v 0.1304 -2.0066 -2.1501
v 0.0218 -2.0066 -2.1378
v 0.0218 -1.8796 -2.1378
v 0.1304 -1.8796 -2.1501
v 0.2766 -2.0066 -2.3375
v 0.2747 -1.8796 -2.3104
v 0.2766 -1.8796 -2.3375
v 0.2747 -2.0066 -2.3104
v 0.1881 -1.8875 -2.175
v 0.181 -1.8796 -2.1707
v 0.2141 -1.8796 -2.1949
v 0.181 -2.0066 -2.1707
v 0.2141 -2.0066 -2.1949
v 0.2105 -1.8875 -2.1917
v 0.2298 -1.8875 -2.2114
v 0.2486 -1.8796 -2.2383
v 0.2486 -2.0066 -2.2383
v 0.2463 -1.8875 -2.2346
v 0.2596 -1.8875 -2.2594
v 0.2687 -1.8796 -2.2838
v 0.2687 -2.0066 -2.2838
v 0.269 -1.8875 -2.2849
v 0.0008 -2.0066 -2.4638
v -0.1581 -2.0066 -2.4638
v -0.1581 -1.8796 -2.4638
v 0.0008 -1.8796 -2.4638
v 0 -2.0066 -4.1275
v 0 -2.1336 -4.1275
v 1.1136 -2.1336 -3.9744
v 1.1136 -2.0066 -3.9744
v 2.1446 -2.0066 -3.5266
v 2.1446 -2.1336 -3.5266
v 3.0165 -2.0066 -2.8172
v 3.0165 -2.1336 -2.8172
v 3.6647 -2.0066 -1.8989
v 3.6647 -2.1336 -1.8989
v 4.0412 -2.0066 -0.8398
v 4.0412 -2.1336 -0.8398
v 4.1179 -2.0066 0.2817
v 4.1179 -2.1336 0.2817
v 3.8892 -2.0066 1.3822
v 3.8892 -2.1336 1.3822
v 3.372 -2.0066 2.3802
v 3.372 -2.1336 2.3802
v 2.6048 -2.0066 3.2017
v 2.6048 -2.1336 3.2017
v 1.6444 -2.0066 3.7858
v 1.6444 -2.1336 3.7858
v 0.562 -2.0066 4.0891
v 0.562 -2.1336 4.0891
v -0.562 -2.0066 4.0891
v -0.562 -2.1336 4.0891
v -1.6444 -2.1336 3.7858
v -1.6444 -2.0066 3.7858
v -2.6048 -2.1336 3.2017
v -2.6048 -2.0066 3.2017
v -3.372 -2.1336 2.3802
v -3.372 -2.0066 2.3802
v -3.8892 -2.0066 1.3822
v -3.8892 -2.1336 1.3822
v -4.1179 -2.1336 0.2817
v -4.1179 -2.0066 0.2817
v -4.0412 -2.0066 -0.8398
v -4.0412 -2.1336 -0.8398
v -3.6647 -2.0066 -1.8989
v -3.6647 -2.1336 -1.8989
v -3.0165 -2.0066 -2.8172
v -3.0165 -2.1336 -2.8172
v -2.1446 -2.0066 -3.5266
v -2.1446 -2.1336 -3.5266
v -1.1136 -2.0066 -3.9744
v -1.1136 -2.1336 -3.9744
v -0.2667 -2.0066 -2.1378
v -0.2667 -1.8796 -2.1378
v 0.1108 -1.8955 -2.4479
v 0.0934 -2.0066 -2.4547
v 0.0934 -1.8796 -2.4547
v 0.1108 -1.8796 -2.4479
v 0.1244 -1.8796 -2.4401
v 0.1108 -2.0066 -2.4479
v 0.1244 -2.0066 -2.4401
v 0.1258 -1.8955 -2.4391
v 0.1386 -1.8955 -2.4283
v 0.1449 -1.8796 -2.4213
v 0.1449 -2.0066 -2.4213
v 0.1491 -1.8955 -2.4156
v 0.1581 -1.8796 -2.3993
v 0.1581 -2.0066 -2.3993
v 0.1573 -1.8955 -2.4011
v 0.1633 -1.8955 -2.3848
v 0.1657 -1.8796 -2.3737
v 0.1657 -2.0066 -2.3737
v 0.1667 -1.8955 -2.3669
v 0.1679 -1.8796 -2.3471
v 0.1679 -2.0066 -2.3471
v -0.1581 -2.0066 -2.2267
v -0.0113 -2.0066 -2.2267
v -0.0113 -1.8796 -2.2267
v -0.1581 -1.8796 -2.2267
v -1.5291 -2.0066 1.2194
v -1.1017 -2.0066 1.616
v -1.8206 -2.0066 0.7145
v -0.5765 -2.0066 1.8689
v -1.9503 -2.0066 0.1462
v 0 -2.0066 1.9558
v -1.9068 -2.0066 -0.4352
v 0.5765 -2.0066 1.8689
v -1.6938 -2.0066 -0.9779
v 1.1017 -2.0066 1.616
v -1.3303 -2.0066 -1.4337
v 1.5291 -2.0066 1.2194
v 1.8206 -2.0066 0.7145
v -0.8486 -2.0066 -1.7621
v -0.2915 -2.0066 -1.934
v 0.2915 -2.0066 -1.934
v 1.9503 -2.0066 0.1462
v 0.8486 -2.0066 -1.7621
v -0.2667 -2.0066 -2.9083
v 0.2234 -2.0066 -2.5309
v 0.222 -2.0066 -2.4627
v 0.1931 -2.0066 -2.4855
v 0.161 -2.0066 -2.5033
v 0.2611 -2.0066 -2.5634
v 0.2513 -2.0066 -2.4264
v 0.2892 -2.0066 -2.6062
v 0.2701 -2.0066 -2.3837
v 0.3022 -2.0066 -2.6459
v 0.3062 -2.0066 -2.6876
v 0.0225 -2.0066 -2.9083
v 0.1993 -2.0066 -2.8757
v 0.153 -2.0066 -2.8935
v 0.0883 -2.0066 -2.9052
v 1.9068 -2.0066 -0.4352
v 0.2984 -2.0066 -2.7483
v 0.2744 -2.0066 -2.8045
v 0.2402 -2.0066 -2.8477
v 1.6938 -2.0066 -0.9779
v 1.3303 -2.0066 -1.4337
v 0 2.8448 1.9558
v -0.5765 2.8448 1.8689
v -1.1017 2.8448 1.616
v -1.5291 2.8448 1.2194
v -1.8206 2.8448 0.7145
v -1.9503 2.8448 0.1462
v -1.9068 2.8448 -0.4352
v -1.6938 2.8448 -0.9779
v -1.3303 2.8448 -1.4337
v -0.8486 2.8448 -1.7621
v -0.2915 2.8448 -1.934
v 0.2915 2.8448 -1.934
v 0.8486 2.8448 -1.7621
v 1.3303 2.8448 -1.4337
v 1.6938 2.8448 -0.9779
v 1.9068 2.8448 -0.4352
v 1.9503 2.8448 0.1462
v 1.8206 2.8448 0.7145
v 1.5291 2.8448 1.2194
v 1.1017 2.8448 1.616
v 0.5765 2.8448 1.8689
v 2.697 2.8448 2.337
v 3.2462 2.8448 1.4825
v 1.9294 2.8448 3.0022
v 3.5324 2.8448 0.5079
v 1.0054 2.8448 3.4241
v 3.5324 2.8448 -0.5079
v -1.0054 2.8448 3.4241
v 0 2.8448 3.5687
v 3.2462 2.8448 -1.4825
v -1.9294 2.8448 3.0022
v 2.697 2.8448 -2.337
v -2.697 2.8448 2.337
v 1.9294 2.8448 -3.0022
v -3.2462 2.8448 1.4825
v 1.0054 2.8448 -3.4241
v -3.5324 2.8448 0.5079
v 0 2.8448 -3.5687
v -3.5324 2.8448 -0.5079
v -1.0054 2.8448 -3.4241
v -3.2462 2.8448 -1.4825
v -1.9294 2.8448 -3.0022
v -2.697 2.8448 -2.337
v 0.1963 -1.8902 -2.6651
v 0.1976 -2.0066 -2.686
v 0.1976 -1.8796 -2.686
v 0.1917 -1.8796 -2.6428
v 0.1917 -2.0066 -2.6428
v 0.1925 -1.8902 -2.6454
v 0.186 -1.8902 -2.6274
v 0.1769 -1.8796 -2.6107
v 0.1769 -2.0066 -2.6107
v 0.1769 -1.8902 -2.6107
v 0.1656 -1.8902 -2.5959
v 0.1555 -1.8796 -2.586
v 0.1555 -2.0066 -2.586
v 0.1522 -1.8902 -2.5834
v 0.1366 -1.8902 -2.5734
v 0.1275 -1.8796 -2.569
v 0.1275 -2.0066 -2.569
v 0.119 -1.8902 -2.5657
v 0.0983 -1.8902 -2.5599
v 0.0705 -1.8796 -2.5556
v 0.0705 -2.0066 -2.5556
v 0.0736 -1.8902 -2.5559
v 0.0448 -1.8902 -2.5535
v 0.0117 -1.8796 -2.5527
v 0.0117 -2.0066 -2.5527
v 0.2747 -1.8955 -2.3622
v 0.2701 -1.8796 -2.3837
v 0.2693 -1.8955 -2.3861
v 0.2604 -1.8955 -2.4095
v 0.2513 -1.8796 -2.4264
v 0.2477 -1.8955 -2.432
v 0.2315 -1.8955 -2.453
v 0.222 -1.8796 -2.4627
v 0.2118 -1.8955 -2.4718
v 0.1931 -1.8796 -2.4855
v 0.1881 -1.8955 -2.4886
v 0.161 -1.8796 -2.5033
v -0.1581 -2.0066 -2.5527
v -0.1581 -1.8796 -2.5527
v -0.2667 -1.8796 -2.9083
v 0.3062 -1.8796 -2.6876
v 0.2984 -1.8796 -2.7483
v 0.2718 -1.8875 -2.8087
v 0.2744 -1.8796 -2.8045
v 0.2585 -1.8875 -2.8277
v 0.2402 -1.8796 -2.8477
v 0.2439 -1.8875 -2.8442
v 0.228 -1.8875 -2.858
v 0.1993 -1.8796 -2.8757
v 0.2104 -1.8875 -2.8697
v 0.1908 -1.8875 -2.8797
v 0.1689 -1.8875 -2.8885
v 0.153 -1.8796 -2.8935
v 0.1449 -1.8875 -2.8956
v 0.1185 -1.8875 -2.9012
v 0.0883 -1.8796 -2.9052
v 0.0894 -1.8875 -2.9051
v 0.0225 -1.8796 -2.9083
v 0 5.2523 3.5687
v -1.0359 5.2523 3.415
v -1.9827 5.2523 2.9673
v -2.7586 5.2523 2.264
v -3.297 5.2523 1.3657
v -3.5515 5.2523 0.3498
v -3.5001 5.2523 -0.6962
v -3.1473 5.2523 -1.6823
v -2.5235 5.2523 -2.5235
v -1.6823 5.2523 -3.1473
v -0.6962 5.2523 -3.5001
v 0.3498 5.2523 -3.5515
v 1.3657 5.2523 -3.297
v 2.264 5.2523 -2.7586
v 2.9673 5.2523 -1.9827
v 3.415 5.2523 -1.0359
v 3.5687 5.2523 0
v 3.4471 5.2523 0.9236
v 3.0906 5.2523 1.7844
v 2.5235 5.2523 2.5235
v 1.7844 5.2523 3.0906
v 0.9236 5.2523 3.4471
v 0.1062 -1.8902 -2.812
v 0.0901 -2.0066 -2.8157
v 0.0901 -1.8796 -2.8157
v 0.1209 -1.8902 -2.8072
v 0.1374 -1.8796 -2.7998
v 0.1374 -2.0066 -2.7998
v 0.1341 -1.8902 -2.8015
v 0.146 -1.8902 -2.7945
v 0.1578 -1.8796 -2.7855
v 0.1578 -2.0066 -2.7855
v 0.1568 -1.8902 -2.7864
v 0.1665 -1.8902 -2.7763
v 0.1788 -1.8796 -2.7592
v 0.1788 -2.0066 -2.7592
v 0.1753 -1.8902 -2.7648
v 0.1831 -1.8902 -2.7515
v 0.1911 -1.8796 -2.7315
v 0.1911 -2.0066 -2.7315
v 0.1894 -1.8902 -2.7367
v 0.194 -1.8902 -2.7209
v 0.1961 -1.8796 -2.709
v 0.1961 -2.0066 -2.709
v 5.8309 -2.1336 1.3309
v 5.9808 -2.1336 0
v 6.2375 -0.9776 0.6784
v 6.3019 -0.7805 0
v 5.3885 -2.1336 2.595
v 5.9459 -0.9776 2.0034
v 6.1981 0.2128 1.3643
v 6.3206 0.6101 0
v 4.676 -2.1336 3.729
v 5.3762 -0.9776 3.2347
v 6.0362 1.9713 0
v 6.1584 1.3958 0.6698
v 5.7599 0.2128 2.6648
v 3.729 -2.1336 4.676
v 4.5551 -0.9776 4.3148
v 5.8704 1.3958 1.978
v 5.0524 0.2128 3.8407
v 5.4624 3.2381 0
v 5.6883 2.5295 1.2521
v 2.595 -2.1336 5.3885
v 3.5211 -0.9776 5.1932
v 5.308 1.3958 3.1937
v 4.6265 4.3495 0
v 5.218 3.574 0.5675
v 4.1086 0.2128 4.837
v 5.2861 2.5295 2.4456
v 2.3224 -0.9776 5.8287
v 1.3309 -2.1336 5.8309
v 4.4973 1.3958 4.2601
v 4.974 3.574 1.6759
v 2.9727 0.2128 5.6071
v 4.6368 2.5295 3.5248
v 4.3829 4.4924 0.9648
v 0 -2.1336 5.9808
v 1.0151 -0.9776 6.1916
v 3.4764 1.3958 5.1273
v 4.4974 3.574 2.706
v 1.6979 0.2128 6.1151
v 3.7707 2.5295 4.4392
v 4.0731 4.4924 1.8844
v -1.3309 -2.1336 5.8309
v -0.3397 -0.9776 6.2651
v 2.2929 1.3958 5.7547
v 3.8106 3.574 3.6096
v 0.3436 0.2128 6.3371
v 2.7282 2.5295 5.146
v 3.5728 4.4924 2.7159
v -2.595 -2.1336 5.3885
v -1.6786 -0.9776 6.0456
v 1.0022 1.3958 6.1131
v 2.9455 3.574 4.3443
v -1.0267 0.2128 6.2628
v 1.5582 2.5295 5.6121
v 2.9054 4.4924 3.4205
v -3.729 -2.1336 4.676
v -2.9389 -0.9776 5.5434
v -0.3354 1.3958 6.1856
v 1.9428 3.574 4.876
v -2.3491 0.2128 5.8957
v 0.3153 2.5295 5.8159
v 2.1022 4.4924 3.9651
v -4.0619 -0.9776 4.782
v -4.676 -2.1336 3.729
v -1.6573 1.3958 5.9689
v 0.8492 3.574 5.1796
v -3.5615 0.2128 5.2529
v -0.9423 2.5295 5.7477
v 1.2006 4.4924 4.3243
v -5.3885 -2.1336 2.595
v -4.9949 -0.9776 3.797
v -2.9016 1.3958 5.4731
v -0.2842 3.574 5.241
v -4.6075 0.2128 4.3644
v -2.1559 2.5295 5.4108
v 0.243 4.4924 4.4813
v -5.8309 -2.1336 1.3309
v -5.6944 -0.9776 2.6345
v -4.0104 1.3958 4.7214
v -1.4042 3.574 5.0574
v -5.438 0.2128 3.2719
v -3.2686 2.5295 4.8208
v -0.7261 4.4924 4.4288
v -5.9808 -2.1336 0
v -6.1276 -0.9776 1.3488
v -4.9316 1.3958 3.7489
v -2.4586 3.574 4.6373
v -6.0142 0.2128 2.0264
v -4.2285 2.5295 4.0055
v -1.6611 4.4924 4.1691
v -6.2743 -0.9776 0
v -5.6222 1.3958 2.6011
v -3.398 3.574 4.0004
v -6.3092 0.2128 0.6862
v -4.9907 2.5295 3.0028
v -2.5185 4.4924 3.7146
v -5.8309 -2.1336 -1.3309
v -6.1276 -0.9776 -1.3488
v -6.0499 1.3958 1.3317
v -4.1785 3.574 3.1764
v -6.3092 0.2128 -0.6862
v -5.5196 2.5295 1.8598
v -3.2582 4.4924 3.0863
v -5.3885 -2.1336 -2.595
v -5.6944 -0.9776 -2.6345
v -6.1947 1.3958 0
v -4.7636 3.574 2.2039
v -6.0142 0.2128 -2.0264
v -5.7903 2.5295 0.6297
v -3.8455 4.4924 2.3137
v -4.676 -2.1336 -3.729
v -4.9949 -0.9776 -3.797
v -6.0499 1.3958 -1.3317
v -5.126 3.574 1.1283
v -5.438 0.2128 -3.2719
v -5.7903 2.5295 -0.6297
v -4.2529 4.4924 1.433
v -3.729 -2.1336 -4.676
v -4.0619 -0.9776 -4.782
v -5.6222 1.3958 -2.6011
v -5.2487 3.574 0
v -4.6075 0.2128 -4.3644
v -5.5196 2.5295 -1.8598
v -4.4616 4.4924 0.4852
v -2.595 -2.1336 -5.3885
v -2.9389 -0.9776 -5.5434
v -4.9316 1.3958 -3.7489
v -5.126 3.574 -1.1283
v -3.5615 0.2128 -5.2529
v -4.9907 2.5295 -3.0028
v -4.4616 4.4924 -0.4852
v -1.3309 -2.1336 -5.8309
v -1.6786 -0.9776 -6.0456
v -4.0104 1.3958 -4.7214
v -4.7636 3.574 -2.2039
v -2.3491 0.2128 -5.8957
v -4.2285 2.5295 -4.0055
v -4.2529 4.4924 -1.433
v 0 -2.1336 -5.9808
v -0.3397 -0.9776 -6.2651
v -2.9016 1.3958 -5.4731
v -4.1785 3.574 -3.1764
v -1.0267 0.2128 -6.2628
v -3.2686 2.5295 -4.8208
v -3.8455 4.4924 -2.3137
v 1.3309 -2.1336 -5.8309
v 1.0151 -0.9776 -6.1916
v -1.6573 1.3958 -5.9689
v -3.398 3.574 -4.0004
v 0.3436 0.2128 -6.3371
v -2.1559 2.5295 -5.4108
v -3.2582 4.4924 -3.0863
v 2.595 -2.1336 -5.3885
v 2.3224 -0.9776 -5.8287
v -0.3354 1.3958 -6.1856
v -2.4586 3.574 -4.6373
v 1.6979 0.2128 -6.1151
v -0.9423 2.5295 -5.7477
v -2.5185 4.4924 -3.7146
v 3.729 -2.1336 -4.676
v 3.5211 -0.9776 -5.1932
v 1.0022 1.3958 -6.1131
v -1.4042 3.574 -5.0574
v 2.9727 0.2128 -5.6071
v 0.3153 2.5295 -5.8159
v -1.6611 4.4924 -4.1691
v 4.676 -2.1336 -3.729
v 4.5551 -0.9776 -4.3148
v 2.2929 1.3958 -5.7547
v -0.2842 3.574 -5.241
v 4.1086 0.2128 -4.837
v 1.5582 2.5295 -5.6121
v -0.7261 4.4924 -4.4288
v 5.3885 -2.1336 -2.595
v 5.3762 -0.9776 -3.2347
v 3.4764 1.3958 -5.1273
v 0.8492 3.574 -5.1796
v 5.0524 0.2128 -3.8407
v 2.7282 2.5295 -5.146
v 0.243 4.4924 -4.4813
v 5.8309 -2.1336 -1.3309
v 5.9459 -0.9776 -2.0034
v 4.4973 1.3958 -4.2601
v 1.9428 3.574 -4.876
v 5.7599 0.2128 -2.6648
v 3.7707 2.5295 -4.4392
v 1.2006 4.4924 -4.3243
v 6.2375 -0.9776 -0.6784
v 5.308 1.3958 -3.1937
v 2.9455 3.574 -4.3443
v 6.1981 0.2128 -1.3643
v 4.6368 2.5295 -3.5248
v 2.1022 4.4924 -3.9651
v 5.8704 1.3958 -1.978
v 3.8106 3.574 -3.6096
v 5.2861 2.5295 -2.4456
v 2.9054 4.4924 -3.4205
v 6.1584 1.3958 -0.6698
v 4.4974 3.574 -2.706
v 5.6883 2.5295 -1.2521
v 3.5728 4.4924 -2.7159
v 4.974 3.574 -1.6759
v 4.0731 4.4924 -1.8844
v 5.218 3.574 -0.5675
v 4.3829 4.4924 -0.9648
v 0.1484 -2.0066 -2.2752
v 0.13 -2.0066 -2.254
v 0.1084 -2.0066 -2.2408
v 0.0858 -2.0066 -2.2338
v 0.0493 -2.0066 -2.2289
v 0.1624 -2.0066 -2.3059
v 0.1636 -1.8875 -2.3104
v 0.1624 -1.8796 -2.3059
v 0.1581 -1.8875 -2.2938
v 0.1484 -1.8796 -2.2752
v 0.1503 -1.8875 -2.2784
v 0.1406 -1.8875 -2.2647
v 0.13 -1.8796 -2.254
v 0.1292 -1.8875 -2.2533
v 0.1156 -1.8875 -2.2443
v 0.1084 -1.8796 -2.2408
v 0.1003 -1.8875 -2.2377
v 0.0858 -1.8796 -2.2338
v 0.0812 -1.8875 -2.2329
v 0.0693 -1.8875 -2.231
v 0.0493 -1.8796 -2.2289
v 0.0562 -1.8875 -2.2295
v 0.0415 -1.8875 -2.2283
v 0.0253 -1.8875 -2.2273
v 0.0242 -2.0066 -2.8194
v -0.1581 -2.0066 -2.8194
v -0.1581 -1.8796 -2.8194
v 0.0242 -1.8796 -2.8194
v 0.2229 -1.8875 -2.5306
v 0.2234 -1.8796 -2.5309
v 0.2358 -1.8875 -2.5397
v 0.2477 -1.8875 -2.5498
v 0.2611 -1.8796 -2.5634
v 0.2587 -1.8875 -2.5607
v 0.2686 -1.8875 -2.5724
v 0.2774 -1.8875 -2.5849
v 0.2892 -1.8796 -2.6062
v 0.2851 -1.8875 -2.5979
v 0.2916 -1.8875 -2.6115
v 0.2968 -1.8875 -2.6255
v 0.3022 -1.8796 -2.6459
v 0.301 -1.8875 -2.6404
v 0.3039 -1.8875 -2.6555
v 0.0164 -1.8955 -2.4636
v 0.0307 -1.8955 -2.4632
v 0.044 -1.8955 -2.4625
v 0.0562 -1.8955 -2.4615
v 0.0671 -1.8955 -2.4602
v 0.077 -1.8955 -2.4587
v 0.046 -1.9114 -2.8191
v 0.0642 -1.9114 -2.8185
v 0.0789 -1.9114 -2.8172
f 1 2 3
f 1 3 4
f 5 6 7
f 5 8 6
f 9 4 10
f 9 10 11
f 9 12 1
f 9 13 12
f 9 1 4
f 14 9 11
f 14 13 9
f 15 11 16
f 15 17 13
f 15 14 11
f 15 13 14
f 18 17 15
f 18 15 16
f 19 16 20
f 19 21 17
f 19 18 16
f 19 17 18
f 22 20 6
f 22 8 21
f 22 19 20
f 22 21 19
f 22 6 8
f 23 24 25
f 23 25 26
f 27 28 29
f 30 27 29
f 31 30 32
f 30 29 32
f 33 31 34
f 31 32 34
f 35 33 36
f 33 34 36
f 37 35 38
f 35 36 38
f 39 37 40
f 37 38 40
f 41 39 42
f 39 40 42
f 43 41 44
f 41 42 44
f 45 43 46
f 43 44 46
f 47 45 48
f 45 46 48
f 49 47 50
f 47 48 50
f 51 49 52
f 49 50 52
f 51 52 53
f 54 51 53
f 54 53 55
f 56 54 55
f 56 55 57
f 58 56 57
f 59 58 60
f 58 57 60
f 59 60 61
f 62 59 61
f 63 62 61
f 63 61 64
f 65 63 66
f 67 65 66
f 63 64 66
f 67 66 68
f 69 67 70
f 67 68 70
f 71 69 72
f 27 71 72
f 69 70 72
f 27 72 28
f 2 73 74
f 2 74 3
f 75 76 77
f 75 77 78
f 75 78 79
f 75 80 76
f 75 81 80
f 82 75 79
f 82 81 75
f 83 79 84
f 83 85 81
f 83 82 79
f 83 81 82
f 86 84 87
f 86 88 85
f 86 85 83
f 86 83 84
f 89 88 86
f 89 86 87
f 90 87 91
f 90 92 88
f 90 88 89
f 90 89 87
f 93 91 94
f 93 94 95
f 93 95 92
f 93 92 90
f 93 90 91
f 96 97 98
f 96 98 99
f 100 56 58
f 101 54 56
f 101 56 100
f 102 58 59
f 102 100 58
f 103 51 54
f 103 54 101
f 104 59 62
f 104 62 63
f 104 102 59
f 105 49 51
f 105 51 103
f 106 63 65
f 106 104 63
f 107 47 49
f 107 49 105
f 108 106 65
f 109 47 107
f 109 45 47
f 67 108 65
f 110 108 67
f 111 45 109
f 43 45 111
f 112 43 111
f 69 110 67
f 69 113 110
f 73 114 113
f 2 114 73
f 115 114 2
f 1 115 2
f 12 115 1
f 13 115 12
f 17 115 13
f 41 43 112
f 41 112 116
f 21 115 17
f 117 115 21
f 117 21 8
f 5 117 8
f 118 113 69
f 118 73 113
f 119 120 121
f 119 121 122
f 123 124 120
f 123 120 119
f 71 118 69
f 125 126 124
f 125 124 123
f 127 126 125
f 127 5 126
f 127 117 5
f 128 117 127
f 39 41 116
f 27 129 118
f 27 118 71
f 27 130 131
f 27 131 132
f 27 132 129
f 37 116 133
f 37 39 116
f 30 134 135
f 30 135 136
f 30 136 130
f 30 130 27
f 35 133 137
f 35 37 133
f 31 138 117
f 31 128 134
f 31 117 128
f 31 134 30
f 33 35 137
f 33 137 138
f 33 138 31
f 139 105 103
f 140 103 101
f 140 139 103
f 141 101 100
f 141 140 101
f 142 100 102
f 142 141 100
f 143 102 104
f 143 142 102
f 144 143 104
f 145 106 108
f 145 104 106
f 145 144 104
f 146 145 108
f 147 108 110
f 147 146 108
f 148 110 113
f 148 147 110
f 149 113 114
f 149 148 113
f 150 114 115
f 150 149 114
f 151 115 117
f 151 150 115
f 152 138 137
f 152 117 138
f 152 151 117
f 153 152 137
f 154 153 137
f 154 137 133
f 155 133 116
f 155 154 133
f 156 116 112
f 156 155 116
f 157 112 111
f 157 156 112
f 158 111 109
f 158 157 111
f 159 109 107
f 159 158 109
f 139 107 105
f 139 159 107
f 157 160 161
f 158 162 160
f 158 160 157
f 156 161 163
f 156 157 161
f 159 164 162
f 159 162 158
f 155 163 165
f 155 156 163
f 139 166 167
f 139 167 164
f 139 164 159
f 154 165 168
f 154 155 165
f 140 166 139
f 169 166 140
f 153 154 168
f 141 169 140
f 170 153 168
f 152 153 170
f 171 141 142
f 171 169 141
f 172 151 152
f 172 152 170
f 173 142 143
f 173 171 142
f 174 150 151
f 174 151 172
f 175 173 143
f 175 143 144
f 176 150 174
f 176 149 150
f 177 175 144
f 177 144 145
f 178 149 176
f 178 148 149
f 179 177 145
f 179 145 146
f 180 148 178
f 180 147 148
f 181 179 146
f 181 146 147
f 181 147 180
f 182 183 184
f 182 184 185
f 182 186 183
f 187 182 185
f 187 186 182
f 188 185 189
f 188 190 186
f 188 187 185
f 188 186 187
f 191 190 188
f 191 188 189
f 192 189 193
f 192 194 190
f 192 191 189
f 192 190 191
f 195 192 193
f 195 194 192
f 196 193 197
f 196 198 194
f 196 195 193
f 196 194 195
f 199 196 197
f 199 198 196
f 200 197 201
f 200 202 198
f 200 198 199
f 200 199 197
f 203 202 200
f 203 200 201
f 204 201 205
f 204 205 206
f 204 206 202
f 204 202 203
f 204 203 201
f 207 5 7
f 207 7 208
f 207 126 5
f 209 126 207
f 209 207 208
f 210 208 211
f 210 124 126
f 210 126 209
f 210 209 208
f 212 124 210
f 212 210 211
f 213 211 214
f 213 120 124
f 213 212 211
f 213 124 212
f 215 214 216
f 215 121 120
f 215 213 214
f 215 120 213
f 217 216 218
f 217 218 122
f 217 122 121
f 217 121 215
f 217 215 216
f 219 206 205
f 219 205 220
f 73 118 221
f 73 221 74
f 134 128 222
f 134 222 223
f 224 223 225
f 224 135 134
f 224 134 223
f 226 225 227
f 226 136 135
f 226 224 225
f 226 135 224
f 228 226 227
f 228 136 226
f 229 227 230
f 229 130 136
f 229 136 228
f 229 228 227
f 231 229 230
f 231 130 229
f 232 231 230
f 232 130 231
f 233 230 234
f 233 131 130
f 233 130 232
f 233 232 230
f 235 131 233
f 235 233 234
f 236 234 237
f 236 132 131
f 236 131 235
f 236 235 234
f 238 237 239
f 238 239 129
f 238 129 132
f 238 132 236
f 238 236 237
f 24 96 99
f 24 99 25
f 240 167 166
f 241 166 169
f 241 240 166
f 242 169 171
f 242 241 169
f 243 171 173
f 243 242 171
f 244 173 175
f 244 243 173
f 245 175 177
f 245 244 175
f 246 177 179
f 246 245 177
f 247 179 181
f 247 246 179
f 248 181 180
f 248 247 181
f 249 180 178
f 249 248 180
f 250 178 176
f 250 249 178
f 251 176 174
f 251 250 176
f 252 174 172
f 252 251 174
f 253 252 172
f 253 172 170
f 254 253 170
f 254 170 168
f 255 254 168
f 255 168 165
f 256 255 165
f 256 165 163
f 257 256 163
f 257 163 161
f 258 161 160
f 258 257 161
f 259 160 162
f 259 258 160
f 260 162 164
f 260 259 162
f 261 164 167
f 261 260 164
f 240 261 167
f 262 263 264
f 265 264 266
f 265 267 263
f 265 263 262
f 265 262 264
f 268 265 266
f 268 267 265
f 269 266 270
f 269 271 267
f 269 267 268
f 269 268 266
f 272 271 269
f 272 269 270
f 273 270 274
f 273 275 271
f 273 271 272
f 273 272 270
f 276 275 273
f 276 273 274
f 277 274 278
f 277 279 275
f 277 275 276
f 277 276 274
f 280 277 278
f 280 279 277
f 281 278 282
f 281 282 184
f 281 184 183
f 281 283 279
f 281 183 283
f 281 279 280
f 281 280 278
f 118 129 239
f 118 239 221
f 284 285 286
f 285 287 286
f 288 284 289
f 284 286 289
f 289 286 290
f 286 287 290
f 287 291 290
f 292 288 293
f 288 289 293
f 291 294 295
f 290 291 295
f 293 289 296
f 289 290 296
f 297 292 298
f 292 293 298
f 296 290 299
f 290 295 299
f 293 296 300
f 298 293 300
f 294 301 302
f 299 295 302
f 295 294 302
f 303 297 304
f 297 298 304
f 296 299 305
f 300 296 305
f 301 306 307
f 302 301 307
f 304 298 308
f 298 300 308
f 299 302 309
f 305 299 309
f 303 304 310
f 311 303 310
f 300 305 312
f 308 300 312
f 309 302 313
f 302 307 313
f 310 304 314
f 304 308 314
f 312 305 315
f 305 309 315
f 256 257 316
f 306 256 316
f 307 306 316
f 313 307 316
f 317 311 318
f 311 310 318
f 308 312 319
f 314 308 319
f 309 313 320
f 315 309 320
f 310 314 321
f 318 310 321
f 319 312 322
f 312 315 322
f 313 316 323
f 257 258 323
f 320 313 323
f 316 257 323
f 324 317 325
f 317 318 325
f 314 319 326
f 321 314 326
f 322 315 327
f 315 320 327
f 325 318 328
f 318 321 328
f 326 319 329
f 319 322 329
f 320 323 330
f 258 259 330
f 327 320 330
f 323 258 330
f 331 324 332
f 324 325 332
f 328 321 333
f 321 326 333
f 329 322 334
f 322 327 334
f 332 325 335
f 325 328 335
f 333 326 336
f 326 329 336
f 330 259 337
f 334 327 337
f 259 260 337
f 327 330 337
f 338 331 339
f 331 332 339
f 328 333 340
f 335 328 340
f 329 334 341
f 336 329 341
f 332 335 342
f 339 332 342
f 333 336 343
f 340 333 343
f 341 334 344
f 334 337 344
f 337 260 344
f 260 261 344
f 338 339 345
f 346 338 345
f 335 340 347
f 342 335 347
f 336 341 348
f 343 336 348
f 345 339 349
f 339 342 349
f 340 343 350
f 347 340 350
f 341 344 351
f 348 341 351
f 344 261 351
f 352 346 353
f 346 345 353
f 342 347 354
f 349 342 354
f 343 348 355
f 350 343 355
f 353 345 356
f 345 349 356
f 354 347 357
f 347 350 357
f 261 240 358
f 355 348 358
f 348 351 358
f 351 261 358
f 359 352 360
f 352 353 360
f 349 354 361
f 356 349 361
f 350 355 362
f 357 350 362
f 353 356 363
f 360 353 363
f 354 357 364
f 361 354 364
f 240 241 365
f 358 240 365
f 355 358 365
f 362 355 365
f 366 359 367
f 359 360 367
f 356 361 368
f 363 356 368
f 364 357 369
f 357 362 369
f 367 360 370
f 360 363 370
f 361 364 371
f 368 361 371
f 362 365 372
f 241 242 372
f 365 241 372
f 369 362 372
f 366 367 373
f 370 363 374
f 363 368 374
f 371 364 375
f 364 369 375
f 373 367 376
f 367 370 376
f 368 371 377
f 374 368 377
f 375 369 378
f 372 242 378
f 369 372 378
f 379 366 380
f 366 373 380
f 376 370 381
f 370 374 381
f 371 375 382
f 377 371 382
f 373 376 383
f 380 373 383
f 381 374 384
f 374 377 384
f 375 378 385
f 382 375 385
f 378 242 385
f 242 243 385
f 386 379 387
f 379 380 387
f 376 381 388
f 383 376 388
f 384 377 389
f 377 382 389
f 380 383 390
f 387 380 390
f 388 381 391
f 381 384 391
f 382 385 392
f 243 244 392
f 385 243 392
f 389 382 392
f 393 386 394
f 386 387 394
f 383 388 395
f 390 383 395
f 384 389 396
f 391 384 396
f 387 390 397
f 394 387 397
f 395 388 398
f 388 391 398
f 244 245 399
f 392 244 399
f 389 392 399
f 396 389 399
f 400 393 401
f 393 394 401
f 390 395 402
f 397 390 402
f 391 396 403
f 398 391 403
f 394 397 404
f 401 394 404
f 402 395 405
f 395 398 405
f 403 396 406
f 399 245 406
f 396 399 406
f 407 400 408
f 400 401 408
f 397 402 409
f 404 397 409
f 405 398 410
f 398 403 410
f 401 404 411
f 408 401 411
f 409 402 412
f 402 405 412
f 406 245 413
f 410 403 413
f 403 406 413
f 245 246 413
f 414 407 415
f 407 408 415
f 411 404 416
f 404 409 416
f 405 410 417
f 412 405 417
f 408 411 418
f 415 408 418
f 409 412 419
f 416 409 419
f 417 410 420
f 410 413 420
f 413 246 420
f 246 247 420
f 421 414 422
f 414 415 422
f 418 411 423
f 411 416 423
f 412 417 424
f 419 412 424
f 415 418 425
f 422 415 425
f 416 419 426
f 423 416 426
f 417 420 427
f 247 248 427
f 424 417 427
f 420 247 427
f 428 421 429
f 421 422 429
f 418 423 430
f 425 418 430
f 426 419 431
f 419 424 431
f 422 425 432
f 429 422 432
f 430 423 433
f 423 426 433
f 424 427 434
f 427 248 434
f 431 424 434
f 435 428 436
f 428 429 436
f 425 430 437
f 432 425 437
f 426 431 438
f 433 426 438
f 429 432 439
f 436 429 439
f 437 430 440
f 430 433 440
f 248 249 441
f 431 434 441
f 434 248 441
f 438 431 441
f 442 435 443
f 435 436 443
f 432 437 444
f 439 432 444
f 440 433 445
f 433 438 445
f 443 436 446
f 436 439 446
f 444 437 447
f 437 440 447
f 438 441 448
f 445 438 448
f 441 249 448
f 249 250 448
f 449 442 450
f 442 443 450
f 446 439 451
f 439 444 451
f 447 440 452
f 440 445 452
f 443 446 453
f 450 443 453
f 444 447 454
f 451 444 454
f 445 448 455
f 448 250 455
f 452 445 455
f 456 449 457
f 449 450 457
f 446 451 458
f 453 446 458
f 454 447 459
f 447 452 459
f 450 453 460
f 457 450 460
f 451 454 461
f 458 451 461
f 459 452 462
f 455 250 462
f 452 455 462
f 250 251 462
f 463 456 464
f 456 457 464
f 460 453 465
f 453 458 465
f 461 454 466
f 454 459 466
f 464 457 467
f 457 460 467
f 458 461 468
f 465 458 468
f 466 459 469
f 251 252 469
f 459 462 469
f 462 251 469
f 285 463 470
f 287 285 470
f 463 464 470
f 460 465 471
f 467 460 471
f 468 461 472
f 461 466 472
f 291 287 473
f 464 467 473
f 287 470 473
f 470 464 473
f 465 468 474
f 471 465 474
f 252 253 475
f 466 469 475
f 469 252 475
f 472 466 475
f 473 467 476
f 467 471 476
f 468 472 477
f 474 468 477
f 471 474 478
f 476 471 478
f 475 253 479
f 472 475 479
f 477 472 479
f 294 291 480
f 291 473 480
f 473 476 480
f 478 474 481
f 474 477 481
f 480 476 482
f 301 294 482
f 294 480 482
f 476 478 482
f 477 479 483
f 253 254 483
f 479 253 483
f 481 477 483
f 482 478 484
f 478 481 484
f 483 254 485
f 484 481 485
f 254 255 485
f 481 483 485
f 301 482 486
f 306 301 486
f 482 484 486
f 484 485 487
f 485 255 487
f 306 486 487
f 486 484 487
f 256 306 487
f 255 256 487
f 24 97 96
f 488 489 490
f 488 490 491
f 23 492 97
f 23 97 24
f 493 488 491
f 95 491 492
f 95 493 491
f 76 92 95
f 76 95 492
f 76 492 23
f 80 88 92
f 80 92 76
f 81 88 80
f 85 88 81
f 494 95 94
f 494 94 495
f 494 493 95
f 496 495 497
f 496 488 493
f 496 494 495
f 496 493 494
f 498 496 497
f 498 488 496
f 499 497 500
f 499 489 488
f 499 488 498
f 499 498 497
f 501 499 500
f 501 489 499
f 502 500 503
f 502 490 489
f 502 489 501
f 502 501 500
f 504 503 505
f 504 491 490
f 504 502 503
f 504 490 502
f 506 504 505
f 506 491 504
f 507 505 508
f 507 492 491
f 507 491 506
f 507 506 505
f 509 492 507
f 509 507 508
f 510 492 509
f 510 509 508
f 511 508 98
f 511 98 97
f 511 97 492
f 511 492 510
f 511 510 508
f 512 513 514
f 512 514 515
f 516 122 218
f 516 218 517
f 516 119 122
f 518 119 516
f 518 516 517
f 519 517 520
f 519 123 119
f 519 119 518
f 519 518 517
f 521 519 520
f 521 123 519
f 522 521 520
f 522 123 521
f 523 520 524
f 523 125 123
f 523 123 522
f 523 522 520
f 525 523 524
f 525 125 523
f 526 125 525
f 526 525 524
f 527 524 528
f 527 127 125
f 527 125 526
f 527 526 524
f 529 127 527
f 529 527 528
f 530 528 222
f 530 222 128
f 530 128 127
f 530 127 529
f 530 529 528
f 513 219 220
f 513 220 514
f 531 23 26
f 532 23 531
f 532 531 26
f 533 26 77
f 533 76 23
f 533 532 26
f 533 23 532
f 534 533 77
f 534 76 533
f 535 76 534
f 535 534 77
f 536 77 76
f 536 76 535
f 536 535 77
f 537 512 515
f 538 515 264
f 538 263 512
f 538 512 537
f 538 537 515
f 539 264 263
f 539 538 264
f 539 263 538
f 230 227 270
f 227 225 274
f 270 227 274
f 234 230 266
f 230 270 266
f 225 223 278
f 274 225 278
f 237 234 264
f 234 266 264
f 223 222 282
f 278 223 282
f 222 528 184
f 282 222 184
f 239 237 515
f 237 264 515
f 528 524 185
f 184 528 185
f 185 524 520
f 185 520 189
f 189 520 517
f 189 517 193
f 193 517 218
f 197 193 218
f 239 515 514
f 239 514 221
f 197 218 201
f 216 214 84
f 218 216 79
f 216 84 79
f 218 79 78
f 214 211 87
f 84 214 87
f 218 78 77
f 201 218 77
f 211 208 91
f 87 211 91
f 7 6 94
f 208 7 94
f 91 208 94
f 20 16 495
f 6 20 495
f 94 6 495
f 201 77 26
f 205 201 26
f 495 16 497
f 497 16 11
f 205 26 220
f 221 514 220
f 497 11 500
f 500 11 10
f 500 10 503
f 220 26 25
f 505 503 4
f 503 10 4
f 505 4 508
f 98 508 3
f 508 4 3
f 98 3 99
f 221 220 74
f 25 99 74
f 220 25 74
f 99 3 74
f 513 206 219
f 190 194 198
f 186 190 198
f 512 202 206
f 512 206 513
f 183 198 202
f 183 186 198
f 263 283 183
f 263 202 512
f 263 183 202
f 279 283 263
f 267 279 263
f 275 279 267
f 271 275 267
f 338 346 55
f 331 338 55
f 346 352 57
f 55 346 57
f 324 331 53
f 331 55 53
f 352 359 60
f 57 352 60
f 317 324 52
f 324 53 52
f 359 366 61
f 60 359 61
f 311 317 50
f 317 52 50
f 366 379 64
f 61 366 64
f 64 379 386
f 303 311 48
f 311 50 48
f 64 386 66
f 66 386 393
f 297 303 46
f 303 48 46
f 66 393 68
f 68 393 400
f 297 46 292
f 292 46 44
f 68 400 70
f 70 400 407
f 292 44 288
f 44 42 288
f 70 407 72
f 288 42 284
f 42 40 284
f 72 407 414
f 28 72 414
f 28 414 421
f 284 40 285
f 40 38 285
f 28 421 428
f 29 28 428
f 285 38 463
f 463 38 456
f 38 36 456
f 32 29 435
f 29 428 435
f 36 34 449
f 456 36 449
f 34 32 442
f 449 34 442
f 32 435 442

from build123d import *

# Parameters (mm, degrees)
TRUNCATED_BALL_DEPTH      = 11.998522628
TRUNCATED_BALL_DEPTH_BACK = 11.998522628
SKETCH3_R                 = 4.1275
RECESSED_DEPTH            = 0.127
CUT_EXTRUDE1_DEPTH        = 0.127


with BuildPart() as part:
    # Sketch1 → Complete_Ball (revolve)
    with BuildSketch(Plane.XY):
        with BuildLine():
            Line((0, 6.35), (0, -6.35))
            ThreePointArc((0, -6.35), (6.35, 0), (0, 6.35))
        make_face()
    revolve(axis=Axis((0, 5.621617492, 0), (0, -1, 0)))

    # Sketch2 → Truncated_ball (cut, two sides)
    with BuildSketch(Plane.XY) as truncated_ball_sk:
        with BuildLine():
            Line((-5.980823609, -2.1336), (5.980823609, -2.1336))
            ThreePointArc((5.980823609, -2.1336), (0, -6.35), (-5.980823609, -2.1336))
        make_face()
    extrude(amount=TRUNCATED_BALL_DEPTH, mode=Mode.SUBTRACT)
    extrude(truncated_ball_sk.sketch, amount=-TRUNCATED_BALL_DEPTH_BACK, mode=Mode.SUBTRACT)

    # Sketch3 → Recessed (cut)
    with BuildSketch(Plane.XZ.offset(2.1336)):
        with Locations(Location((0, 0, 0), (0, 0, 270))):
            Circle(SKETCH3_R)
    extrude(amount=-RECESSED_DEPTH, mode=Mode.SUBTRACT)

    # Sketch5 → Counterbored_hole (revolve, cut)
    with BuildSketch(Plane.XY, mode=Mode.PRIVATE) as counterbored_hole_sk:
        Polygon((1.9558, -2.1336), (1.9558, 2.8448), (3.5687, 2.8448), (3.5687, 6.35), (0, 6.35), (0, -2.1336), align=None)
    revolve(counterbored_hole_sk.sketch.rotate(Axis((0, 7.818373071, 0), (0, -1, 0)), 90), axis=Axis((0, 7.818373071, 0), (0, -1, 0)), mode=Mode.SUBTRACT)

    # Sketch9 → Cut-Extrude1 (cut)
    with BuildSketch(Plane.XZ.offset(2.0066)):
        with BuildLine():
            Line((-0.266710017, -2.9083), (-0.266710017, -2.137804395))
            Line((-0.266710017, -2.137804395), (0.021762797, -2.137804395))
            add(Edge.make_bspline(
                [(0.021762797, -2.137804395), (0.028916445, -2.137831838), (0.042875247, -2.137885387), (0.063257985, -2.1392246), (0.08256196, -2.141056366), (0.100828728, -2.143417569), (0.117979251, -2.146843626), (0.133997544, -2.150994066), (0.148966969, -2.155781463), (0.167264808, -2.16307422), (0.188351063, -2.174299324), (0.210936444, -2.19104895), (0.230586604, -2.211159242), (0.246755795, -2.234216831), (0.260077465, -2.258846684), (0.269522373, -2.28457958), (0.275561015, -2.31085525), (0.276246169, -2.328647268), (0.276588166, -2.337528215)],
                knots=[0, 0, 0, 0, 0.939712594, 1.833646414, 2.682508961, 3.487467313, 4.25240329, 4.978730417, 5.660668875, 6.315918528, 7.564895217, 8.787077865, 9.996481721, 11.241996224, 12.475862915, 13.665015424, 14.834484263, 16, 16, 16, 16], degree=3))
            add(Edge.make_bspline(
                [(0.276588166, -2.337528215), (0.276228655, -2.345790733), (0.275513098, -2.362236109), (0.269818069, -2.386461149), (0.260829571, -2.409983511), (0.24811958, -2.432517235), (0.231874618, -2.453650072), (0.211735504, -2.472667007), (0.187991636, -2.489608795), (0.170171864, -2.498639265), (0.160982956, -2.5032959)],
                knots=[0, 0, 0, 0, 0.926741525, 1.844548388, 2.778836836, 3.746021974, 4.738420572, 5.759761325, 6.844803049, 8, 8, 8, 8], degree=3))
            add(Edge.make_bspline(
                [(0.160982956, -2.5032959), (0.166667275, -2.505075335), (0.177796205, -2.508559168), (0.193795198, -2.514934092), (0.208813366, -2.522192856), (0.2228834, -2.530347388), (0.23591023, -2.539473202), (0.2478571, -2.549584525), (0.258806843, -2.560524888), (0.268739897, -2.572287634), (0.277465043, -2.58479707), (0.285290409, -2.597779786), (0.291752256, -2.611392125), (0.297048797, -2.625598745), (0.301180886, -2.640311862), (0.304148175, -2.655588064), (0.305839455, -2.671391794), (0.306093479, -2.68212759), (0.306222612, -2.687585113)],
                knots=[0, 0, 0, 0, 1.127427615, 2.20731145, 3.257257018, 4.283066884, 5.282973838, 6.264540225, 7.242620376, 8.210460609, 9.17525685, 10.12748095, 11.077310519, 12.023587065, 12.994999128, 13.967387486, 14.966724908, 16, 16, 16, 16], degree=3))
            add(Edge.make_bspline(
                [(0.306222612, -2.687585113), (0.30595645, -2.69634709), (0.305428882, -2.713714396), (0.301191929, -2.739276148), (0.294031702, -2.7638644), (0.28417626, -2.787081588), (0.272433103, -2.808549297), (0.259086593, -2.827705432), (0.244477096, -2.844352877), (0.22819322, -2.858356354), (0.210340006, -2.870241208), (0.190413202, -2.880249032), (0.168566879, -2.889074974), (0.144357023, -2.896125462), (0.117794653, -2.901726361), (0.088519295, -2.905365274), (0.056485971, -2.907970248), (0.034167963, -2.908187011), (0.022534527, -2.9083)],
                knots=[0, 0, 0, 0, 1.028073207, 2.037766189, 3.031549473, 4.027532207, 4.992436545, 5.898794514, 6.762903869, 7.584966804, 8.412380356, 9.273953678, 10.198004568, 11.174406109, 12.229717296, 13.381036288, 14.634844708, 16, 16, 16, 16], degree=3))
            Line((0.022534527, -2.9083), (-0.266710017, -2.9083))
        make_face()
        with BuildLine():
            Line((-0.158050381, -2.463783305), (0.00077173, -2.463783305))
            add(Edge.make_bspline(
                [(0.00077173, -2.463783305), (0.005968785, -2.463762743), (0.015953502, -2.46372324), (0.030356217, -2.463172446), (0.043649233, -2.46270254), (0.055781131, -2.461523111), (0.066812012, -2.460367914), (0.076697733, -2.458812838), (0.085486714, -2.45706062), (0.090868209, -2.455435306), (0.093379375, -2.454676886)],
                knots=[0, 0, 0, 0, 1.335841395, 2.566453063, 3.705076039, 4.753984432, 5.69893722, 6.555639608, 7.326018133, 8, 8, 8, 8], degree=3))
            add(Edge.make_bspline(
                [(0.093379375, -2.454676886), (0.099279717, -2.452609996), (0.11065434, -2.448625465), (0.125897399, -2.439576193), (0.138880055, -2.428717112), (0.149567516, -2.415856475), (0.157780301, -2.401063109), (0.163869844, -2.384643791), (0.167204004, -2.366368995), (0.167680456, -2.353696066), (0.167928529, -2.347097672)],
                knots=[0, 0, 0, 0, 1.059015028, 2.041559358, 2.989777133, 3.920090524, 4.862499371, 5.848878527, 6.879979022, 8, 8, 8, 8], degree=3))
            add(Edge.make_bspline(
                [(0.167928529, -2.347097672), (0.167729061, -2.340756189), (0.167340322, -2.328397369), (0.164077197, -2.31045022), (0.158430481, -2.293753694), (0.150783282, -2.278311452), (0.141099895, -2.264573361), (0.129542435, -2.252761818), (0.115697414, -2.243832811), (0.102756467, -2.238262878), (0.09111711, -2.23477836), (0.080717754, -2.232716714), (0.068921782, -2.230900199), (0.055690377, -2.229355858), (0.041018534, -2.228157307), (0.024861047, -2.227205138), (0.007256378, -2.22680087), (-0.00493898, -2.226739552), (-0.011267263, -2.226707734)],
                knots=[0, 0, 0, 0, 1.216168307, 2.37017178, 3.484610845, 4.588286376, 5.664695412, 6.69777344, 7.738183022, 8.803673002, 9.390844981, 10.0665252, 10.835811589, 11.680682236, 12.621801058, 13.660007223, 14.785756265, 16, 16, 16, 16], degree=3))
            Line((-0.011267263, -2.226707734), (-0.158050381, -2.226707734))
            Line((-0.158050381, -2.226707734), (-0.158050381, -2.463783305))
        make_face(mode=Mode.SUBTRACT)
        with BuildLine():
            Line((-0.158050381, -2.819396661), (0.024232334, -2.819396661))
            add(Edge.make_bspline(
                [(0.024232334, -2.819396661), (0.031486765, -2.819313318), (0.044815157, -2.819160193), (0.063045794, -2.818679835), (0.077781785, -2.817506499), (0.086386824, -2.816243115), (0.090138108, -2.815692355)],
                knots=[0, 0, 0, 0, 1.317581857, 2.420761387, 3.311546315, 4, 4, 4, 4], degree=3))
            add(Edge.make_bspline(
                [(0.090138108, -2.815692355), (0.095516334, -2.814561906), (0.105929971, -2.812373065), (0.120610701, -2.807487801), (0.134071074, -2.80189147), (0.14607616, -2.794779154), (0.157192582, -2.786582698), (0.16685358, -2.776344933), (0.175751817, -2.764713097), (0.183461357, -2.751401785), (0.189695639, -2.736675926), (0.194460394, -2.720763047), (0.19699845, -2.703718942), (0.197372145, -2.692017237), (0.197562976, -2.686041652)],
                knots=[0, 0, 0, 0, 1.067651492, 2.067249321, 3.003744366, 3.895862395, 4.774133402, 5.679610569, 6.621910665, 7.616993802, 8.661192143, 9.724711987, 10.838102842, 12, 12, 12, 12], degree=3))
            add(Edge.make_bspline(
                [(0.197562976, -2.686041652), (0.197350369, -2.679025957), (0.196935765, -2.665344636), (0.192994812, -2.645574434), (0.186485001, -2.627237325), (0.177321084, -2.610587261), (0.166081062, -2.595611962), (0.15248177, -2.582908823), (0.136624895, -2.572828254), (0.118461703, -2.564916959), (0.09723257, -2.559288208), (0.072351402, -2.555469442), (0.043420216, -2.553005284), (0.02274604, -2.552797406), (0.011730302, -2.552686644)],
                knots=[0, 0, 0, 0, 0.96167883, 1.875371887, 2.752872588, 3.621584364, 4.472914353, 5.312011319, 6.159851575, 7.038572308, 8.019870099, 9.164119506, 10.488969081, 12, 12, 12, 12], degree=3))
            Line((0.011730302, -2.552686644), (-0.158050381, -2.552686644))
            Line((-0.158050381, -2.552686644), (-0.158050381, -2.819396661))
        make_face(mode=Mode.SUBTRACT)
    extrude(amount=-CUT_EXTRUDE1_DEPTH, mode=Mode.SUBTRACT)


solid = part.part
